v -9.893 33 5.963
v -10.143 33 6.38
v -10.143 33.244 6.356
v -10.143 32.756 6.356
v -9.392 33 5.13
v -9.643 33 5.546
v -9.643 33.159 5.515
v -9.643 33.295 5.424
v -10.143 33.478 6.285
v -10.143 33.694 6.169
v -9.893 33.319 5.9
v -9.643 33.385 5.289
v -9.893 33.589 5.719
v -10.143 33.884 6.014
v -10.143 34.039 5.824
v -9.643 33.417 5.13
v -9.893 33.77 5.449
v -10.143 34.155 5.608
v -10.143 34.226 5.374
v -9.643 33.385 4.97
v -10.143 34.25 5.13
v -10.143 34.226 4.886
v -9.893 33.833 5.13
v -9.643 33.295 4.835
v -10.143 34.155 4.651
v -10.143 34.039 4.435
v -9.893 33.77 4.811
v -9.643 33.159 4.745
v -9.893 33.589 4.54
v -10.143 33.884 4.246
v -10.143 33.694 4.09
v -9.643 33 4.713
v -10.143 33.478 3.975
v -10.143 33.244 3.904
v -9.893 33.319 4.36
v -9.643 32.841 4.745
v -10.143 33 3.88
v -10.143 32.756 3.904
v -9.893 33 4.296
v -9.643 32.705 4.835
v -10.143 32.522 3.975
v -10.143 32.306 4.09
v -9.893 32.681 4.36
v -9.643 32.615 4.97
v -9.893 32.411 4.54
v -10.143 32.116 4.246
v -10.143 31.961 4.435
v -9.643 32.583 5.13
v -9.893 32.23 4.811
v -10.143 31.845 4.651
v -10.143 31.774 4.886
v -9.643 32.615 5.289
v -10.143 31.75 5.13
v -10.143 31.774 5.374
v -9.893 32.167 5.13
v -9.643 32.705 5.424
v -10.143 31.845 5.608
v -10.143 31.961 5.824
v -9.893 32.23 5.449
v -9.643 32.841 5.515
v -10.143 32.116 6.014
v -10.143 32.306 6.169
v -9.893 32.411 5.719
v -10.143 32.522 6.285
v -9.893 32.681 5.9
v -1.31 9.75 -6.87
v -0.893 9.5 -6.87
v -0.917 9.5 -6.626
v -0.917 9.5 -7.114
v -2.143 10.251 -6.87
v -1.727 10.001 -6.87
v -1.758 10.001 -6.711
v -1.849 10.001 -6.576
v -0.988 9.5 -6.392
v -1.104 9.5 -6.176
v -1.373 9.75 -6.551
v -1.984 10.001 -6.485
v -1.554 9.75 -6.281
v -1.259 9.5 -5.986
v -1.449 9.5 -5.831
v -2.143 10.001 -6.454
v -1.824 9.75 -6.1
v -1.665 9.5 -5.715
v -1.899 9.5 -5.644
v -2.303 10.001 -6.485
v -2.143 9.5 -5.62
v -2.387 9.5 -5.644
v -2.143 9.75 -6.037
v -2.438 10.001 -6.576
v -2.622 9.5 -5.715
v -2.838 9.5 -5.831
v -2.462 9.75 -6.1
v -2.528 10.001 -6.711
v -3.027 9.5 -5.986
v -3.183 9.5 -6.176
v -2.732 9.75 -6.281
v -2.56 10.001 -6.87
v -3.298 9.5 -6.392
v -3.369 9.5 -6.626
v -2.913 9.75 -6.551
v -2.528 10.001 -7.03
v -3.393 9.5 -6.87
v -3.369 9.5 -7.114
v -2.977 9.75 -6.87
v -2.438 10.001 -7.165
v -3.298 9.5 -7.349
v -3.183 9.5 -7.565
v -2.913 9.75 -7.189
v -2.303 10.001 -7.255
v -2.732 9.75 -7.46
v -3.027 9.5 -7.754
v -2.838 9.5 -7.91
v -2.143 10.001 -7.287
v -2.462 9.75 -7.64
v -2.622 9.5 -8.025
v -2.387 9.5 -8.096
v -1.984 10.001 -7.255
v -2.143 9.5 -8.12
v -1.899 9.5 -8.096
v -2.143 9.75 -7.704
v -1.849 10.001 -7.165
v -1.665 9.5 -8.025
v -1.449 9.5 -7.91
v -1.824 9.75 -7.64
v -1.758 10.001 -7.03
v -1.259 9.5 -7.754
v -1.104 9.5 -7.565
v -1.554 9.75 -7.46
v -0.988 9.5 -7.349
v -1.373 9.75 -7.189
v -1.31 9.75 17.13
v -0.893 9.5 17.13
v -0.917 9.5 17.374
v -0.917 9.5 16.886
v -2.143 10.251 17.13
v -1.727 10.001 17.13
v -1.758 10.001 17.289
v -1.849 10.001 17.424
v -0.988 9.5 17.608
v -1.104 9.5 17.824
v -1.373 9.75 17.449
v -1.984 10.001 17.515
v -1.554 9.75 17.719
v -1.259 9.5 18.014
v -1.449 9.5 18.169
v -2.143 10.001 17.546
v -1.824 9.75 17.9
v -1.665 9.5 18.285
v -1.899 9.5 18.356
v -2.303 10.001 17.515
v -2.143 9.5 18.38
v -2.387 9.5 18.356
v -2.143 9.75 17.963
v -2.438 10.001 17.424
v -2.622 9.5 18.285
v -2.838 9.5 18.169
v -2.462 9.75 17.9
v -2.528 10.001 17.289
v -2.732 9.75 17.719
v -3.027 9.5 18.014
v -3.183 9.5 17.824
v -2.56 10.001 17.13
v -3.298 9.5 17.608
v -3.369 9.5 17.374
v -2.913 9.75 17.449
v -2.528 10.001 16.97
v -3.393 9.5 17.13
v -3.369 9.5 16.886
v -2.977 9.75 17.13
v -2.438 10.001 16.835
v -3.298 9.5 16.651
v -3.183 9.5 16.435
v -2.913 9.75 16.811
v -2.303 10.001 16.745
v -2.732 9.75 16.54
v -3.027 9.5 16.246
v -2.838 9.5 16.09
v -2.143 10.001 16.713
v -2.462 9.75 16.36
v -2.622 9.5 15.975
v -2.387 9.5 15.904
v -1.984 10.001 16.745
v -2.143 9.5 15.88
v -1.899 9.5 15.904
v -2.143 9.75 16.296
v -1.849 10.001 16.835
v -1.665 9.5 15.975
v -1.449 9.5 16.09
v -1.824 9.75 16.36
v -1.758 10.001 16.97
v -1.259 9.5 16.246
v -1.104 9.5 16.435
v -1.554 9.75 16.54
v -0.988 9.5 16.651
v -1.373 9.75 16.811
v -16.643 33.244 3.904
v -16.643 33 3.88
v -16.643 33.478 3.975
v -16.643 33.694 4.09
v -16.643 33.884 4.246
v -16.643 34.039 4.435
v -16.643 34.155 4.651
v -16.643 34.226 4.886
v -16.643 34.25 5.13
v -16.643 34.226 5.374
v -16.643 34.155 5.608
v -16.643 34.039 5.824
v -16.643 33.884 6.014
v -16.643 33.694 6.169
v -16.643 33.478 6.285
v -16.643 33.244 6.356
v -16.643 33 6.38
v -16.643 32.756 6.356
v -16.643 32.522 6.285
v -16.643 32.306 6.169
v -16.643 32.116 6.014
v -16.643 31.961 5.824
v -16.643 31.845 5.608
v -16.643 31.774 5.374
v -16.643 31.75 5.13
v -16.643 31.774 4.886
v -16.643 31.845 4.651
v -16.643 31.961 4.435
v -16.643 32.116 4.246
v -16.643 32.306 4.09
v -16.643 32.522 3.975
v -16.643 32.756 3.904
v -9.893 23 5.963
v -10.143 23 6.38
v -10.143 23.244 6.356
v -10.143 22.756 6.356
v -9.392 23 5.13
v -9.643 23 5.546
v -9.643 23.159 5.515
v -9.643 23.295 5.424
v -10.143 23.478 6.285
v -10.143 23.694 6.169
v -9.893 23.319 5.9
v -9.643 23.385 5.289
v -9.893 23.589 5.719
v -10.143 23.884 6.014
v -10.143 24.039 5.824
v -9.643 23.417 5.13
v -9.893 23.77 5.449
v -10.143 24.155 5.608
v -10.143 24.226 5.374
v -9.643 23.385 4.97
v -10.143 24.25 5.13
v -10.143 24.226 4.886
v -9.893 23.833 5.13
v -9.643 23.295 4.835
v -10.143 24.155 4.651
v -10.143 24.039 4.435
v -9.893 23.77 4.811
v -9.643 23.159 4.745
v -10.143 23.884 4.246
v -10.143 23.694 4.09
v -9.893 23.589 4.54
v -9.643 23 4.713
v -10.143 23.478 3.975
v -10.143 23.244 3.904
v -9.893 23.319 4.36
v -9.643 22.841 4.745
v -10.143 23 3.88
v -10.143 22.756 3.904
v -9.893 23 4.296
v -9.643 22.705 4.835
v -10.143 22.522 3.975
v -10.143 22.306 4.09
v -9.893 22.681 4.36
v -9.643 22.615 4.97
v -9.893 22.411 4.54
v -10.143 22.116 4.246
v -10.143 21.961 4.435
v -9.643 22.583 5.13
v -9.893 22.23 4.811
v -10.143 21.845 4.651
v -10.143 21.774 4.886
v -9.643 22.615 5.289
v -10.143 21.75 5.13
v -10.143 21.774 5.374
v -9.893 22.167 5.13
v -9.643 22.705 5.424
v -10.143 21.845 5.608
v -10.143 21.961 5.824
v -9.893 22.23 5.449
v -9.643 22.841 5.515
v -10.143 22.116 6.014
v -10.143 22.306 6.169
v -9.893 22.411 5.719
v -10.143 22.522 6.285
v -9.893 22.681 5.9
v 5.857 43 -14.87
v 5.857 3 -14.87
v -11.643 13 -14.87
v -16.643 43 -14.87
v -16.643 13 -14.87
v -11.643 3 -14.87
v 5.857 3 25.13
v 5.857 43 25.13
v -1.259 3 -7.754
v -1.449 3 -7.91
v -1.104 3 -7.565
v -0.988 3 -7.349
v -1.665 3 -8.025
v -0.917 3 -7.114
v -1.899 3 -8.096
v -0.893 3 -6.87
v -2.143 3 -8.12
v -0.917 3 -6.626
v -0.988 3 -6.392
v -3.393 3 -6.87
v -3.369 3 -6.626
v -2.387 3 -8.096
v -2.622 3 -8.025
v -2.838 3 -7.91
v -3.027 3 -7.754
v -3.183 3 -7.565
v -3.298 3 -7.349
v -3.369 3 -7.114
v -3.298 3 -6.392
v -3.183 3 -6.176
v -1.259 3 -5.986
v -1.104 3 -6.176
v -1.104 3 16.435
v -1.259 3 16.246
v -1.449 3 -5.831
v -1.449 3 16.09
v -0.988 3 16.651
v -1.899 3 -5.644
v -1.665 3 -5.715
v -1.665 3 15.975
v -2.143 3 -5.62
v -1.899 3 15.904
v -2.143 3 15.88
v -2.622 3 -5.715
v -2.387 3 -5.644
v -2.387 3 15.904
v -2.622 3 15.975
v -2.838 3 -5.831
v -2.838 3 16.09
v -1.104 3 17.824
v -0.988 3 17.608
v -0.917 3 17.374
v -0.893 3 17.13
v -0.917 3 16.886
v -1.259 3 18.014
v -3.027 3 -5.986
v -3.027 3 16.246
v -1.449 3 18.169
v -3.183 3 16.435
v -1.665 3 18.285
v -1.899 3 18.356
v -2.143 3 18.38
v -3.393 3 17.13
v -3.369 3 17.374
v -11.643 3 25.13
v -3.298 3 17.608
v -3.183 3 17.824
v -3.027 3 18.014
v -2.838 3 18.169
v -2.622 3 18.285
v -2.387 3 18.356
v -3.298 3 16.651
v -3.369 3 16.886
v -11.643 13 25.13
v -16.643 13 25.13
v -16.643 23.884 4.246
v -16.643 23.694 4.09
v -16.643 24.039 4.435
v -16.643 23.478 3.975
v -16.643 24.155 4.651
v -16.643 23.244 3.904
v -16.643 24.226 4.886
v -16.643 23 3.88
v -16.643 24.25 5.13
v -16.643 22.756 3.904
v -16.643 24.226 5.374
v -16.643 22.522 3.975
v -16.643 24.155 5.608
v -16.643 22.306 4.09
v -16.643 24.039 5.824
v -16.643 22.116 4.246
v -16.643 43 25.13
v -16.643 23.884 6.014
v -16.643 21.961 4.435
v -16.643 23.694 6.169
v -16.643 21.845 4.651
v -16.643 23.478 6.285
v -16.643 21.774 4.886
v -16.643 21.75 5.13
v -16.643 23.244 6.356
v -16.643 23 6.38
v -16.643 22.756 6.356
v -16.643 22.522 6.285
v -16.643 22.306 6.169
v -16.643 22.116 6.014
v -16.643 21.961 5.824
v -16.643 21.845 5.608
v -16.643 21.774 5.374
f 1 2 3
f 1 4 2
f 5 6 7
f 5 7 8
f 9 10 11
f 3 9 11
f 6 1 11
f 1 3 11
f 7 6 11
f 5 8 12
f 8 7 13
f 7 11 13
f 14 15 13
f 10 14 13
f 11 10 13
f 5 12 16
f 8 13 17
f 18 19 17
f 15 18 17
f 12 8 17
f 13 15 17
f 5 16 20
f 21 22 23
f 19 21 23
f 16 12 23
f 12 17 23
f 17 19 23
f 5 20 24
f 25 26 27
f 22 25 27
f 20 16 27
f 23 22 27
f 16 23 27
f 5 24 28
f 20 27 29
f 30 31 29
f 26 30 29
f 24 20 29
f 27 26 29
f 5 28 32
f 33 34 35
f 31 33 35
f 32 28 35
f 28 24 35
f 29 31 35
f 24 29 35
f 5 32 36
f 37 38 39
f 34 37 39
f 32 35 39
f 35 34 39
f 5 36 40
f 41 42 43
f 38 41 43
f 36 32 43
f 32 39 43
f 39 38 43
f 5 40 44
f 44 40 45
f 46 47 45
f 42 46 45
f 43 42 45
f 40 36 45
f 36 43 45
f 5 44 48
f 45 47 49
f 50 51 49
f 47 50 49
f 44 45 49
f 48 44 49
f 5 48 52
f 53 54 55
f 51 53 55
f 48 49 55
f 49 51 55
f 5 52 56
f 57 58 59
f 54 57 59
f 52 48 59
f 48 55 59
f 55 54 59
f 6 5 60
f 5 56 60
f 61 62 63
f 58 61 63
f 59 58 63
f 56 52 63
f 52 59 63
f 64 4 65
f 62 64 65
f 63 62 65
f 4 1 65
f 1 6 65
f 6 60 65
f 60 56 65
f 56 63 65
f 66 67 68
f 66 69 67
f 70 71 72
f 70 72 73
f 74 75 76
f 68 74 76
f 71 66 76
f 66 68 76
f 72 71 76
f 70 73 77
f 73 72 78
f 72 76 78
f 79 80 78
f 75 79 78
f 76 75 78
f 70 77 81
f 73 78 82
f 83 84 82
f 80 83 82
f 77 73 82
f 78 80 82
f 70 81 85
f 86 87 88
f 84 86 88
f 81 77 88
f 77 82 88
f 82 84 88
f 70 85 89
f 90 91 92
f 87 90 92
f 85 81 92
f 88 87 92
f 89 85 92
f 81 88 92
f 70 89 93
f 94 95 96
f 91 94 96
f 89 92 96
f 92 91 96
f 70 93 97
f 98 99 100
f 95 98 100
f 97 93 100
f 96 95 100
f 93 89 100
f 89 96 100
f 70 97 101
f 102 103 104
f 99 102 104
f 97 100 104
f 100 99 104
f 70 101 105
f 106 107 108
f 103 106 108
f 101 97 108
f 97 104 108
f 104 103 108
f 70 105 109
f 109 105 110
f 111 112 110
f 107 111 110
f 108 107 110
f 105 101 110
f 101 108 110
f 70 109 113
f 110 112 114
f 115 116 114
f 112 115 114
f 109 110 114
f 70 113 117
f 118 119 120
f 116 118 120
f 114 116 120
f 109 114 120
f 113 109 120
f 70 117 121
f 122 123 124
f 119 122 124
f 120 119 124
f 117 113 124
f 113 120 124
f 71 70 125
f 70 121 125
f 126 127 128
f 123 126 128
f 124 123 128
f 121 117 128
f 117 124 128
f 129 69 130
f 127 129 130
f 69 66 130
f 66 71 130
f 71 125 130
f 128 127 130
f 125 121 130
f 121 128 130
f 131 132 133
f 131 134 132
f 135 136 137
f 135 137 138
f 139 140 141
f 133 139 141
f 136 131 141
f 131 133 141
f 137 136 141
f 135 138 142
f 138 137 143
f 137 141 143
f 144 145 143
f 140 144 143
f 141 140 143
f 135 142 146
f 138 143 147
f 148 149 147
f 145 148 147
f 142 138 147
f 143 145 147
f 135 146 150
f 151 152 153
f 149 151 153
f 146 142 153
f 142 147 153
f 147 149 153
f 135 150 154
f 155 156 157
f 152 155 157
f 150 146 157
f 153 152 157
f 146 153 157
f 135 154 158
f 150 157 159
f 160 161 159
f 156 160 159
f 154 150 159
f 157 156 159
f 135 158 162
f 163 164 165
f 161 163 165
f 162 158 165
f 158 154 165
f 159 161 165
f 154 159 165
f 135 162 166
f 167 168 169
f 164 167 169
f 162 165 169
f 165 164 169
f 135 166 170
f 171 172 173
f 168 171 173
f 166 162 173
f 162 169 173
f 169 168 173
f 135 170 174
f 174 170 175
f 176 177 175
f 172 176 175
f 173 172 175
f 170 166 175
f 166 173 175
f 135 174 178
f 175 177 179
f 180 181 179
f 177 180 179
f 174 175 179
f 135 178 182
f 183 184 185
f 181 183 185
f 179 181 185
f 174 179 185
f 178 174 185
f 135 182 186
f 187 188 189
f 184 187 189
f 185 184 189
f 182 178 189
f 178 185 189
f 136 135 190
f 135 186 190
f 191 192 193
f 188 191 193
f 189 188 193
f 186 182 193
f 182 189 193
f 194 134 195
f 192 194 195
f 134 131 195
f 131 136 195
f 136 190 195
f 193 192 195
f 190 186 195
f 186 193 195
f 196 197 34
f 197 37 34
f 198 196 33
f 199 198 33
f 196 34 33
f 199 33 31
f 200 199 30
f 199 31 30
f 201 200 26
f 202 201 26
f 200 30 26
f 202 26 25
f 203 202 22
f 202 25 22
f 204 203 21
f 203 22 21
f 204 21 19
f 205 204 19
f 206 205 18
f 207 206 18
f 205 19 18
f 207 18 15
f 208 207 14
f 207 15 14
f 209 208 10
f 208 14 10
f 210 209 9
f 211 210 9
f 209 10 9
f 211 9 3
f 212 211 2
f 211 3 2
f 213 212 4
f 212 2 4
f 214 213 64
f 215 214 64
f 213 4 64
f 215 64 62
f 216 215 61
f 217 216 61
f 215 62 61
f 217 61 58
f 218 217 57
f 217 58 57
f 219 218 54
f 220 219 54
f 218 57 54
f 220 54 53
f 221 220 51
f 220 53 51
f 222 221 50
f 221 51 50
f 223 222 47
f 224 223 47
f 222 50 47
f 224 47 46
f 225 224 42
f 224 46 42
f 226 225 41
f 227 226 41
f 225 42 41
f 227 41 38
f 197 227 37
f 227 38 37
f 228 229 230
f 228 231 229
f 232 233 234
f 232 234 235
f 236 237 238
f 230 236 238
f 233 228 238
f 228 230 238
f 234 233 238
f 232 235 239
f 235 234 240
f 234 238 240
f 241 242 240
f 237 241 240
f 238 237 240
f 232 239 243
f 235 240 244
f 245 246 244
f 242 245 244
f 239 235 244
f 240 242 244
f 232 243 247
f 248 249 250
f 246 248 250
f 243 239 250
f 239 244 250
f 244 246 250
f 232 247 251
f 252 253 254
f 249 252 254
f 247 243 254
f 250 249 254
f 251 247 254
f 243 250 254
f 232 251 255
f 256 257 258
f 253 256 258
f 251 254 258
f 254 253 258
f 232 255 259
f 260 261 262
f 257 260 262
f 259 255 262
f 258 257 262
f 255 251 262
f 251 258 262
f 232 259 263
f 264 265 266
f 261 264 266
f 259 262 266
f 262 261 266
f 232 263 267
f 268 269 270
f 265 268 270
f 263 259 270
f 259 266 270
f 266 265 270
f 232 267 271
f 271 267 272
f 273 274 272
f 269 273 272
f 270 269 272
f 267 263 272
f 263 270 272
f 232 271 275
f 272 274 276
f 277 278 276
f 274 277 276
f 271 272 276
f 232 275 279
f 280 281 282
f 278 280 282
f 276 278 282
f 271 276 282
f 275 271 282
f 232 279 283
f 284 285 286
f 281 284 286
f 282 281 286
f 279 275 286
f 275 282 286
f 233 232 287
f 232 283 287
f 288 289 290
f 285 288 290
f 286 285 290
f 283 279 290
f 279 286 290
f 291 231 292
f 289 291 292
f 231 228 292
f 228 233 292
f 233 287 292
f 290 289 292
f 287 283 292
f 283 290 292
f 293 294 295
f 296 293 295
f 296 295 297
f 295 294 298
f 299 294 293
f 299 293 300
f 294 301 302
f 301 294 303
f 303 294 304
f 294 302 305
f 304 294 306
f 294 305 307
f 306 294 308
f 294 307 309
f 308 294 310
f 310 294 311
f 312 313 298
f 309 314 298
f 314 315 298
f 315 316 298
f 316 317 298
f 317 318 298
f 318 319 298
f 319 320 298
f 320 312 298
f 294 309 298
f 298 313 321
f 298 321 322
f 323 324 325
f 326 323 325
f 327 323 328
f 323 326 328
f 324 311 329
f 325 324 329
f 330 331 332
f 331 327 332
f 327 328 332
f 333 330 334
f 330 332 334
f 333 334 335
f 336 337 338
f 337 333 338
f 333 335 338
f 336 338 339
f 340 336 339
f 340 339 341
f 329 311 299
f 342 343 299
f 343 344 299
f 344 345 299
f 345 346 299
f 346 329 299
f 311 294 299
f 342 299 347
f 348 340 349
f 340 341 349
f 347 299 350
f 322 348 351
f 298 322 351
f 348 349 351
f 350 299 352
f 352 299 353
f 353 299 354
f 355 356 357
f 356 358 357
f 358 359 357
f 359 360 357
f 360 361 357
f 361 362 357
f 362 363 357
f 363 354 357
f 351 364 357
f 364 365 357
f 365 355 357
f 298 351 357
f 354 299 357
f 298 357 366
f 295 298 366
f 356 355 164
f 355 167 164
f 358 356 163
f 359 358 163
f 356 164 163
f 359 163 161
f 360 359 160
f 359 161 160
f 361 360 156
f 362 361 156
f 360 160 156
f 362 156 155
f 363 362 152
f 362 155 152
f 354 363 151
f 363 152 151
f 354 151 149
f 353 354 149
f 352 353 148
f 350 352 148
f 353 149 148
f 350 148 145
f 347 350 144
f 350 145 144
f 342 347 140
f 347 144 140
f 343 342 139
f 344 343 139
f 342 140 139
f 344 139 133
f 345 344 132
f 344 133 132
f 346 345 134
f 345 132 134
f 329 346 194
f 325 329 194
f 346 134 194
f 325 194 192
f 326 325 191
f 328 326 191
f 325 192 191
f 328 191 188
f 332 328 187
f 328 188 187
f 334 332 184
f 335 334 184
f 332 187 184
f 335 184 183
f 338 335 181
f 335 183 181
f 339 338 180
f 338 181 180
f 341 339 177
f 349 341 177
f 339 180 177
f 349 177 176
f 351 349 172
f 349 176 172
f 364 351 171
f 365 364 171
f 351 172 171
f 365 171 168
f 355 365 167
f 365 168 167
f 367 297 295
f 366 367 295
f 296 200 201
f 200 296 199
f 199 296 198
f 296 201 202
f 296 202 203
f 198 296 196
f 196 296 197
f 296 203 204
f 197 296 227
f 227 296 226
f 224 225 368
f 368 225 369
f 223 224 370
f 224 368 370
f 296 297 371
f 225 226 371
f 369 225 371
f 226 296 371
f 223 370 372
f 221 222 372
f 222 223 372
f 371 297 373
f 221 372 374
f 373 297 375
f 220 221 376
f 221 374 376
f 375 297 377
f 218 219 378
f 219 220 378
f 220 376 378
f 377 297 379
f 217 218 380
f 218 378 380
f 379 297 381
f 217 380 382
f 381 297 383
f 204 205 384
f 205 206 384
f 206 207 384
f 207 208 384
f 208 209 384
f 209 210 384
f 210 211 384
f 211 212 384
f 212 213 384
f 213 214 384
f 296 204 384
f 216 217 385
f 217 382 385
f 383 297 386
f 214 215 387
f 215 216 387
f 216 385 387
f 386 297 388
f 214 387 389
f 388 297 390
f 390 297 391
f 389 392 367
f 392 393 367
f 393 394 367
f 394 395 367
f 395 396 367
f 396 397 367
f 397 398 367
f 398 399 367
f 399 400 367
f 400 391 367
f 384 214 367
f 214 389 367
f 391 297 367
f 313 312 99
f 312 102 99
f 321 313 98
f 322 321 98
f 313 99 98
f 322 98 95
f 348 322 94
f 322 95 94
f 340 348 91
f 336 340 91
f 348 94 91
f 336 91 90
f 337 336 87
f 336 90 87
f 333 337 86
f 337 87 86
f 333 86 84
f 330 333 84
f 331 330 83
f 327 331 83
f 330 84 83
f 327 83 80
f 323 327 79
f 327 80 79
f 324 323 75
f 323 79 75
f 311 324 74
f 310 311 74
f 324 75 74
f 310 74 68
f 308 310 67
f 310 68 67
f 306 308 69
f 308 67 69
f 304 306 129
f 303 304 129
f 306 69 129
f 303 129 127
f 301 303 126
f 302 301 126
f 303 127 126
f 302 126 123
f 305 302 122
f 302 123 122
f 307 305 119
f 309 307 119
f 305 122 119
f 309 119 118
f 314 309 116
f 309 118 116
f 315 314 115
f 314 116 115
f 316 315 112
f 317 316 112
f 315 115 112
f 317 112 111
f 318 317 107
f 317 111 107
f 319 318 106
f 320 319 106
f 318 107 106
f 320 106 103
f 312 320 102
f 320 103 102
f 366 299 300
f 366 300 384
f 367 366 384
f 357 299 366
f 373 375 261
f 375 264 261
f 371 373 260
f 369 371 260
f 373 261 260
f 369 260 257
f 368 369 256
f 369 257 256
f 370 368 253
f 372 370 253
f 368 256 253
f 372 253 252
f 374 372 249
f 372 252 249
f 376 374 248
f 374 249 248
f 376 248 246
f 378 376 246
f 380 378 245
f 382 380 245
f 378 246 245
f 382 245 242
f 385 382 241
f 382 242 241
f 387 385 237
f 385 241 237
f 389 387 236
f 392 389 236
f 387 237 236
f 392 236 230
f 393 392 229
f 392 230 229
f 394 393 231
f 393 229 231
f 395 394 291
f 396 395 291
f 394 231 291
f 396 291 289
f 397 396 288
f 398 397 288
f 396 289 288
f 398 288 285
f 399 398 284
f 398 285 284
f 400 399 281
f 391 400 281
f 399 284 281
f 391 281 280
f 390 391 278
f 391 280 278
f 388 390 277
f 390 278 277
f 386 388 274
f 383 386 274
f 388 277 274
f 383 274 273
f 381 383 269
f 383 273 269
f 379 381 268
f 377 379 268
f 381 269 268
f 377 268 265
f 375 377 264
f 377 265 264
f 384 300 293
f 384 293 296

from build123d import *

# Parameters (mm, degrees)
SKETCH1_W                 = 22.5
SKETCH1_H                 = 40
BOSS_EXTRUDE1_DEPTH       = 40
SKETCH2_W                 = 5
SKETCH2_H                 = 10
CUT_EXTRUDE1_DEPTH        = 40
M3X0_5_TAPPED_HOLE2_D     = 2.5
M3X0_5_TAPPED_HOLE2_DEPTH = 6.5
M3X0_5_TAPPED_HOLE2_TIP   = 0.751075774
M3X0_5_TAPPED_HOLE3_D     = 2.5
M3X0_5_TAPPED_HOLE3_DEPTH = 6.5
M3X0_5_TAPPED_HOLE3_TIP   = 0.751075774


with BuildPart() as part:
    # Sketch1 → Boss-Extrude1 (new body)
    with BuildSketch(Plane(origin=(0, 3, 0), x_dir=(-1, 0, 0), z_dir=(0, 1, 0))):
        with Locations((5.393225555, 5.12970783)):
            Rectangle(SKETCH1_W, SKETCH1_H)
    extrude(amount=BOSS_EXTRUDE1_DEPTH)

    # Sketch2 → Cut-Extrude1 (cut)
    with BuildSketch(Plane.XY.offset(25.12970783)):
        with Locations((-14.143225555, 8)):
            Rectangle(SKETCH2_W, SKETCH2_H)
    extrude(amount=-CUT_EXTRUDE1_DEPTH, mode=Mode.SUBTRACT)

    # M3x0.5 Tapped Hole2
    with Locations(Plane.ZY.offset(16.643225555)):
        with Locations((5.12970783, 23), (5.12970783, 33)):
            Hole(M3X0_5_TAPPED_HOLE2_D / 2, depth=M3X0_5_TAPPED_HOLE2_DEPTH)
            with Locations((0, 0, -(M3X0_5_TAPPED_HOLE2_DEPTH + M3X0_5_TAPPED_HOLE2_TIP / 2))):  # 118° drill point
                Cone(0, M3X0_5_TAPPED_HOLE2_D / 2, M3X0_5_TAPPED_HOLE2_TIP, mode=Mode.SUBTRACT)

    # M3x0.5 Tapped Hole3
    with Locations(Plane.XZ.offset(-3)):
        with Locations((-2.143225555, 17.12970783), (-2.143225555, -6.87029217)):
            Hole(M3X0_5_TAPPED_HOLE3_D / 2, depth=M3X0_5_TAPPED_HOLE3_DEPTH)
            with Locations((0, 0, -(M3X0_5_TAPPED_HOLE3_DEPTH + M3X0_5_TAPPED_HOLE3_TIP / 2))):  # 118° drill point
                Cone(0, M3X0_5_TAPPED_HOLE3_D / 2, M3X0_5_TAPPED_HOLE3_TIP, mode=Mode.SUBTRACT)


solid = part.part
